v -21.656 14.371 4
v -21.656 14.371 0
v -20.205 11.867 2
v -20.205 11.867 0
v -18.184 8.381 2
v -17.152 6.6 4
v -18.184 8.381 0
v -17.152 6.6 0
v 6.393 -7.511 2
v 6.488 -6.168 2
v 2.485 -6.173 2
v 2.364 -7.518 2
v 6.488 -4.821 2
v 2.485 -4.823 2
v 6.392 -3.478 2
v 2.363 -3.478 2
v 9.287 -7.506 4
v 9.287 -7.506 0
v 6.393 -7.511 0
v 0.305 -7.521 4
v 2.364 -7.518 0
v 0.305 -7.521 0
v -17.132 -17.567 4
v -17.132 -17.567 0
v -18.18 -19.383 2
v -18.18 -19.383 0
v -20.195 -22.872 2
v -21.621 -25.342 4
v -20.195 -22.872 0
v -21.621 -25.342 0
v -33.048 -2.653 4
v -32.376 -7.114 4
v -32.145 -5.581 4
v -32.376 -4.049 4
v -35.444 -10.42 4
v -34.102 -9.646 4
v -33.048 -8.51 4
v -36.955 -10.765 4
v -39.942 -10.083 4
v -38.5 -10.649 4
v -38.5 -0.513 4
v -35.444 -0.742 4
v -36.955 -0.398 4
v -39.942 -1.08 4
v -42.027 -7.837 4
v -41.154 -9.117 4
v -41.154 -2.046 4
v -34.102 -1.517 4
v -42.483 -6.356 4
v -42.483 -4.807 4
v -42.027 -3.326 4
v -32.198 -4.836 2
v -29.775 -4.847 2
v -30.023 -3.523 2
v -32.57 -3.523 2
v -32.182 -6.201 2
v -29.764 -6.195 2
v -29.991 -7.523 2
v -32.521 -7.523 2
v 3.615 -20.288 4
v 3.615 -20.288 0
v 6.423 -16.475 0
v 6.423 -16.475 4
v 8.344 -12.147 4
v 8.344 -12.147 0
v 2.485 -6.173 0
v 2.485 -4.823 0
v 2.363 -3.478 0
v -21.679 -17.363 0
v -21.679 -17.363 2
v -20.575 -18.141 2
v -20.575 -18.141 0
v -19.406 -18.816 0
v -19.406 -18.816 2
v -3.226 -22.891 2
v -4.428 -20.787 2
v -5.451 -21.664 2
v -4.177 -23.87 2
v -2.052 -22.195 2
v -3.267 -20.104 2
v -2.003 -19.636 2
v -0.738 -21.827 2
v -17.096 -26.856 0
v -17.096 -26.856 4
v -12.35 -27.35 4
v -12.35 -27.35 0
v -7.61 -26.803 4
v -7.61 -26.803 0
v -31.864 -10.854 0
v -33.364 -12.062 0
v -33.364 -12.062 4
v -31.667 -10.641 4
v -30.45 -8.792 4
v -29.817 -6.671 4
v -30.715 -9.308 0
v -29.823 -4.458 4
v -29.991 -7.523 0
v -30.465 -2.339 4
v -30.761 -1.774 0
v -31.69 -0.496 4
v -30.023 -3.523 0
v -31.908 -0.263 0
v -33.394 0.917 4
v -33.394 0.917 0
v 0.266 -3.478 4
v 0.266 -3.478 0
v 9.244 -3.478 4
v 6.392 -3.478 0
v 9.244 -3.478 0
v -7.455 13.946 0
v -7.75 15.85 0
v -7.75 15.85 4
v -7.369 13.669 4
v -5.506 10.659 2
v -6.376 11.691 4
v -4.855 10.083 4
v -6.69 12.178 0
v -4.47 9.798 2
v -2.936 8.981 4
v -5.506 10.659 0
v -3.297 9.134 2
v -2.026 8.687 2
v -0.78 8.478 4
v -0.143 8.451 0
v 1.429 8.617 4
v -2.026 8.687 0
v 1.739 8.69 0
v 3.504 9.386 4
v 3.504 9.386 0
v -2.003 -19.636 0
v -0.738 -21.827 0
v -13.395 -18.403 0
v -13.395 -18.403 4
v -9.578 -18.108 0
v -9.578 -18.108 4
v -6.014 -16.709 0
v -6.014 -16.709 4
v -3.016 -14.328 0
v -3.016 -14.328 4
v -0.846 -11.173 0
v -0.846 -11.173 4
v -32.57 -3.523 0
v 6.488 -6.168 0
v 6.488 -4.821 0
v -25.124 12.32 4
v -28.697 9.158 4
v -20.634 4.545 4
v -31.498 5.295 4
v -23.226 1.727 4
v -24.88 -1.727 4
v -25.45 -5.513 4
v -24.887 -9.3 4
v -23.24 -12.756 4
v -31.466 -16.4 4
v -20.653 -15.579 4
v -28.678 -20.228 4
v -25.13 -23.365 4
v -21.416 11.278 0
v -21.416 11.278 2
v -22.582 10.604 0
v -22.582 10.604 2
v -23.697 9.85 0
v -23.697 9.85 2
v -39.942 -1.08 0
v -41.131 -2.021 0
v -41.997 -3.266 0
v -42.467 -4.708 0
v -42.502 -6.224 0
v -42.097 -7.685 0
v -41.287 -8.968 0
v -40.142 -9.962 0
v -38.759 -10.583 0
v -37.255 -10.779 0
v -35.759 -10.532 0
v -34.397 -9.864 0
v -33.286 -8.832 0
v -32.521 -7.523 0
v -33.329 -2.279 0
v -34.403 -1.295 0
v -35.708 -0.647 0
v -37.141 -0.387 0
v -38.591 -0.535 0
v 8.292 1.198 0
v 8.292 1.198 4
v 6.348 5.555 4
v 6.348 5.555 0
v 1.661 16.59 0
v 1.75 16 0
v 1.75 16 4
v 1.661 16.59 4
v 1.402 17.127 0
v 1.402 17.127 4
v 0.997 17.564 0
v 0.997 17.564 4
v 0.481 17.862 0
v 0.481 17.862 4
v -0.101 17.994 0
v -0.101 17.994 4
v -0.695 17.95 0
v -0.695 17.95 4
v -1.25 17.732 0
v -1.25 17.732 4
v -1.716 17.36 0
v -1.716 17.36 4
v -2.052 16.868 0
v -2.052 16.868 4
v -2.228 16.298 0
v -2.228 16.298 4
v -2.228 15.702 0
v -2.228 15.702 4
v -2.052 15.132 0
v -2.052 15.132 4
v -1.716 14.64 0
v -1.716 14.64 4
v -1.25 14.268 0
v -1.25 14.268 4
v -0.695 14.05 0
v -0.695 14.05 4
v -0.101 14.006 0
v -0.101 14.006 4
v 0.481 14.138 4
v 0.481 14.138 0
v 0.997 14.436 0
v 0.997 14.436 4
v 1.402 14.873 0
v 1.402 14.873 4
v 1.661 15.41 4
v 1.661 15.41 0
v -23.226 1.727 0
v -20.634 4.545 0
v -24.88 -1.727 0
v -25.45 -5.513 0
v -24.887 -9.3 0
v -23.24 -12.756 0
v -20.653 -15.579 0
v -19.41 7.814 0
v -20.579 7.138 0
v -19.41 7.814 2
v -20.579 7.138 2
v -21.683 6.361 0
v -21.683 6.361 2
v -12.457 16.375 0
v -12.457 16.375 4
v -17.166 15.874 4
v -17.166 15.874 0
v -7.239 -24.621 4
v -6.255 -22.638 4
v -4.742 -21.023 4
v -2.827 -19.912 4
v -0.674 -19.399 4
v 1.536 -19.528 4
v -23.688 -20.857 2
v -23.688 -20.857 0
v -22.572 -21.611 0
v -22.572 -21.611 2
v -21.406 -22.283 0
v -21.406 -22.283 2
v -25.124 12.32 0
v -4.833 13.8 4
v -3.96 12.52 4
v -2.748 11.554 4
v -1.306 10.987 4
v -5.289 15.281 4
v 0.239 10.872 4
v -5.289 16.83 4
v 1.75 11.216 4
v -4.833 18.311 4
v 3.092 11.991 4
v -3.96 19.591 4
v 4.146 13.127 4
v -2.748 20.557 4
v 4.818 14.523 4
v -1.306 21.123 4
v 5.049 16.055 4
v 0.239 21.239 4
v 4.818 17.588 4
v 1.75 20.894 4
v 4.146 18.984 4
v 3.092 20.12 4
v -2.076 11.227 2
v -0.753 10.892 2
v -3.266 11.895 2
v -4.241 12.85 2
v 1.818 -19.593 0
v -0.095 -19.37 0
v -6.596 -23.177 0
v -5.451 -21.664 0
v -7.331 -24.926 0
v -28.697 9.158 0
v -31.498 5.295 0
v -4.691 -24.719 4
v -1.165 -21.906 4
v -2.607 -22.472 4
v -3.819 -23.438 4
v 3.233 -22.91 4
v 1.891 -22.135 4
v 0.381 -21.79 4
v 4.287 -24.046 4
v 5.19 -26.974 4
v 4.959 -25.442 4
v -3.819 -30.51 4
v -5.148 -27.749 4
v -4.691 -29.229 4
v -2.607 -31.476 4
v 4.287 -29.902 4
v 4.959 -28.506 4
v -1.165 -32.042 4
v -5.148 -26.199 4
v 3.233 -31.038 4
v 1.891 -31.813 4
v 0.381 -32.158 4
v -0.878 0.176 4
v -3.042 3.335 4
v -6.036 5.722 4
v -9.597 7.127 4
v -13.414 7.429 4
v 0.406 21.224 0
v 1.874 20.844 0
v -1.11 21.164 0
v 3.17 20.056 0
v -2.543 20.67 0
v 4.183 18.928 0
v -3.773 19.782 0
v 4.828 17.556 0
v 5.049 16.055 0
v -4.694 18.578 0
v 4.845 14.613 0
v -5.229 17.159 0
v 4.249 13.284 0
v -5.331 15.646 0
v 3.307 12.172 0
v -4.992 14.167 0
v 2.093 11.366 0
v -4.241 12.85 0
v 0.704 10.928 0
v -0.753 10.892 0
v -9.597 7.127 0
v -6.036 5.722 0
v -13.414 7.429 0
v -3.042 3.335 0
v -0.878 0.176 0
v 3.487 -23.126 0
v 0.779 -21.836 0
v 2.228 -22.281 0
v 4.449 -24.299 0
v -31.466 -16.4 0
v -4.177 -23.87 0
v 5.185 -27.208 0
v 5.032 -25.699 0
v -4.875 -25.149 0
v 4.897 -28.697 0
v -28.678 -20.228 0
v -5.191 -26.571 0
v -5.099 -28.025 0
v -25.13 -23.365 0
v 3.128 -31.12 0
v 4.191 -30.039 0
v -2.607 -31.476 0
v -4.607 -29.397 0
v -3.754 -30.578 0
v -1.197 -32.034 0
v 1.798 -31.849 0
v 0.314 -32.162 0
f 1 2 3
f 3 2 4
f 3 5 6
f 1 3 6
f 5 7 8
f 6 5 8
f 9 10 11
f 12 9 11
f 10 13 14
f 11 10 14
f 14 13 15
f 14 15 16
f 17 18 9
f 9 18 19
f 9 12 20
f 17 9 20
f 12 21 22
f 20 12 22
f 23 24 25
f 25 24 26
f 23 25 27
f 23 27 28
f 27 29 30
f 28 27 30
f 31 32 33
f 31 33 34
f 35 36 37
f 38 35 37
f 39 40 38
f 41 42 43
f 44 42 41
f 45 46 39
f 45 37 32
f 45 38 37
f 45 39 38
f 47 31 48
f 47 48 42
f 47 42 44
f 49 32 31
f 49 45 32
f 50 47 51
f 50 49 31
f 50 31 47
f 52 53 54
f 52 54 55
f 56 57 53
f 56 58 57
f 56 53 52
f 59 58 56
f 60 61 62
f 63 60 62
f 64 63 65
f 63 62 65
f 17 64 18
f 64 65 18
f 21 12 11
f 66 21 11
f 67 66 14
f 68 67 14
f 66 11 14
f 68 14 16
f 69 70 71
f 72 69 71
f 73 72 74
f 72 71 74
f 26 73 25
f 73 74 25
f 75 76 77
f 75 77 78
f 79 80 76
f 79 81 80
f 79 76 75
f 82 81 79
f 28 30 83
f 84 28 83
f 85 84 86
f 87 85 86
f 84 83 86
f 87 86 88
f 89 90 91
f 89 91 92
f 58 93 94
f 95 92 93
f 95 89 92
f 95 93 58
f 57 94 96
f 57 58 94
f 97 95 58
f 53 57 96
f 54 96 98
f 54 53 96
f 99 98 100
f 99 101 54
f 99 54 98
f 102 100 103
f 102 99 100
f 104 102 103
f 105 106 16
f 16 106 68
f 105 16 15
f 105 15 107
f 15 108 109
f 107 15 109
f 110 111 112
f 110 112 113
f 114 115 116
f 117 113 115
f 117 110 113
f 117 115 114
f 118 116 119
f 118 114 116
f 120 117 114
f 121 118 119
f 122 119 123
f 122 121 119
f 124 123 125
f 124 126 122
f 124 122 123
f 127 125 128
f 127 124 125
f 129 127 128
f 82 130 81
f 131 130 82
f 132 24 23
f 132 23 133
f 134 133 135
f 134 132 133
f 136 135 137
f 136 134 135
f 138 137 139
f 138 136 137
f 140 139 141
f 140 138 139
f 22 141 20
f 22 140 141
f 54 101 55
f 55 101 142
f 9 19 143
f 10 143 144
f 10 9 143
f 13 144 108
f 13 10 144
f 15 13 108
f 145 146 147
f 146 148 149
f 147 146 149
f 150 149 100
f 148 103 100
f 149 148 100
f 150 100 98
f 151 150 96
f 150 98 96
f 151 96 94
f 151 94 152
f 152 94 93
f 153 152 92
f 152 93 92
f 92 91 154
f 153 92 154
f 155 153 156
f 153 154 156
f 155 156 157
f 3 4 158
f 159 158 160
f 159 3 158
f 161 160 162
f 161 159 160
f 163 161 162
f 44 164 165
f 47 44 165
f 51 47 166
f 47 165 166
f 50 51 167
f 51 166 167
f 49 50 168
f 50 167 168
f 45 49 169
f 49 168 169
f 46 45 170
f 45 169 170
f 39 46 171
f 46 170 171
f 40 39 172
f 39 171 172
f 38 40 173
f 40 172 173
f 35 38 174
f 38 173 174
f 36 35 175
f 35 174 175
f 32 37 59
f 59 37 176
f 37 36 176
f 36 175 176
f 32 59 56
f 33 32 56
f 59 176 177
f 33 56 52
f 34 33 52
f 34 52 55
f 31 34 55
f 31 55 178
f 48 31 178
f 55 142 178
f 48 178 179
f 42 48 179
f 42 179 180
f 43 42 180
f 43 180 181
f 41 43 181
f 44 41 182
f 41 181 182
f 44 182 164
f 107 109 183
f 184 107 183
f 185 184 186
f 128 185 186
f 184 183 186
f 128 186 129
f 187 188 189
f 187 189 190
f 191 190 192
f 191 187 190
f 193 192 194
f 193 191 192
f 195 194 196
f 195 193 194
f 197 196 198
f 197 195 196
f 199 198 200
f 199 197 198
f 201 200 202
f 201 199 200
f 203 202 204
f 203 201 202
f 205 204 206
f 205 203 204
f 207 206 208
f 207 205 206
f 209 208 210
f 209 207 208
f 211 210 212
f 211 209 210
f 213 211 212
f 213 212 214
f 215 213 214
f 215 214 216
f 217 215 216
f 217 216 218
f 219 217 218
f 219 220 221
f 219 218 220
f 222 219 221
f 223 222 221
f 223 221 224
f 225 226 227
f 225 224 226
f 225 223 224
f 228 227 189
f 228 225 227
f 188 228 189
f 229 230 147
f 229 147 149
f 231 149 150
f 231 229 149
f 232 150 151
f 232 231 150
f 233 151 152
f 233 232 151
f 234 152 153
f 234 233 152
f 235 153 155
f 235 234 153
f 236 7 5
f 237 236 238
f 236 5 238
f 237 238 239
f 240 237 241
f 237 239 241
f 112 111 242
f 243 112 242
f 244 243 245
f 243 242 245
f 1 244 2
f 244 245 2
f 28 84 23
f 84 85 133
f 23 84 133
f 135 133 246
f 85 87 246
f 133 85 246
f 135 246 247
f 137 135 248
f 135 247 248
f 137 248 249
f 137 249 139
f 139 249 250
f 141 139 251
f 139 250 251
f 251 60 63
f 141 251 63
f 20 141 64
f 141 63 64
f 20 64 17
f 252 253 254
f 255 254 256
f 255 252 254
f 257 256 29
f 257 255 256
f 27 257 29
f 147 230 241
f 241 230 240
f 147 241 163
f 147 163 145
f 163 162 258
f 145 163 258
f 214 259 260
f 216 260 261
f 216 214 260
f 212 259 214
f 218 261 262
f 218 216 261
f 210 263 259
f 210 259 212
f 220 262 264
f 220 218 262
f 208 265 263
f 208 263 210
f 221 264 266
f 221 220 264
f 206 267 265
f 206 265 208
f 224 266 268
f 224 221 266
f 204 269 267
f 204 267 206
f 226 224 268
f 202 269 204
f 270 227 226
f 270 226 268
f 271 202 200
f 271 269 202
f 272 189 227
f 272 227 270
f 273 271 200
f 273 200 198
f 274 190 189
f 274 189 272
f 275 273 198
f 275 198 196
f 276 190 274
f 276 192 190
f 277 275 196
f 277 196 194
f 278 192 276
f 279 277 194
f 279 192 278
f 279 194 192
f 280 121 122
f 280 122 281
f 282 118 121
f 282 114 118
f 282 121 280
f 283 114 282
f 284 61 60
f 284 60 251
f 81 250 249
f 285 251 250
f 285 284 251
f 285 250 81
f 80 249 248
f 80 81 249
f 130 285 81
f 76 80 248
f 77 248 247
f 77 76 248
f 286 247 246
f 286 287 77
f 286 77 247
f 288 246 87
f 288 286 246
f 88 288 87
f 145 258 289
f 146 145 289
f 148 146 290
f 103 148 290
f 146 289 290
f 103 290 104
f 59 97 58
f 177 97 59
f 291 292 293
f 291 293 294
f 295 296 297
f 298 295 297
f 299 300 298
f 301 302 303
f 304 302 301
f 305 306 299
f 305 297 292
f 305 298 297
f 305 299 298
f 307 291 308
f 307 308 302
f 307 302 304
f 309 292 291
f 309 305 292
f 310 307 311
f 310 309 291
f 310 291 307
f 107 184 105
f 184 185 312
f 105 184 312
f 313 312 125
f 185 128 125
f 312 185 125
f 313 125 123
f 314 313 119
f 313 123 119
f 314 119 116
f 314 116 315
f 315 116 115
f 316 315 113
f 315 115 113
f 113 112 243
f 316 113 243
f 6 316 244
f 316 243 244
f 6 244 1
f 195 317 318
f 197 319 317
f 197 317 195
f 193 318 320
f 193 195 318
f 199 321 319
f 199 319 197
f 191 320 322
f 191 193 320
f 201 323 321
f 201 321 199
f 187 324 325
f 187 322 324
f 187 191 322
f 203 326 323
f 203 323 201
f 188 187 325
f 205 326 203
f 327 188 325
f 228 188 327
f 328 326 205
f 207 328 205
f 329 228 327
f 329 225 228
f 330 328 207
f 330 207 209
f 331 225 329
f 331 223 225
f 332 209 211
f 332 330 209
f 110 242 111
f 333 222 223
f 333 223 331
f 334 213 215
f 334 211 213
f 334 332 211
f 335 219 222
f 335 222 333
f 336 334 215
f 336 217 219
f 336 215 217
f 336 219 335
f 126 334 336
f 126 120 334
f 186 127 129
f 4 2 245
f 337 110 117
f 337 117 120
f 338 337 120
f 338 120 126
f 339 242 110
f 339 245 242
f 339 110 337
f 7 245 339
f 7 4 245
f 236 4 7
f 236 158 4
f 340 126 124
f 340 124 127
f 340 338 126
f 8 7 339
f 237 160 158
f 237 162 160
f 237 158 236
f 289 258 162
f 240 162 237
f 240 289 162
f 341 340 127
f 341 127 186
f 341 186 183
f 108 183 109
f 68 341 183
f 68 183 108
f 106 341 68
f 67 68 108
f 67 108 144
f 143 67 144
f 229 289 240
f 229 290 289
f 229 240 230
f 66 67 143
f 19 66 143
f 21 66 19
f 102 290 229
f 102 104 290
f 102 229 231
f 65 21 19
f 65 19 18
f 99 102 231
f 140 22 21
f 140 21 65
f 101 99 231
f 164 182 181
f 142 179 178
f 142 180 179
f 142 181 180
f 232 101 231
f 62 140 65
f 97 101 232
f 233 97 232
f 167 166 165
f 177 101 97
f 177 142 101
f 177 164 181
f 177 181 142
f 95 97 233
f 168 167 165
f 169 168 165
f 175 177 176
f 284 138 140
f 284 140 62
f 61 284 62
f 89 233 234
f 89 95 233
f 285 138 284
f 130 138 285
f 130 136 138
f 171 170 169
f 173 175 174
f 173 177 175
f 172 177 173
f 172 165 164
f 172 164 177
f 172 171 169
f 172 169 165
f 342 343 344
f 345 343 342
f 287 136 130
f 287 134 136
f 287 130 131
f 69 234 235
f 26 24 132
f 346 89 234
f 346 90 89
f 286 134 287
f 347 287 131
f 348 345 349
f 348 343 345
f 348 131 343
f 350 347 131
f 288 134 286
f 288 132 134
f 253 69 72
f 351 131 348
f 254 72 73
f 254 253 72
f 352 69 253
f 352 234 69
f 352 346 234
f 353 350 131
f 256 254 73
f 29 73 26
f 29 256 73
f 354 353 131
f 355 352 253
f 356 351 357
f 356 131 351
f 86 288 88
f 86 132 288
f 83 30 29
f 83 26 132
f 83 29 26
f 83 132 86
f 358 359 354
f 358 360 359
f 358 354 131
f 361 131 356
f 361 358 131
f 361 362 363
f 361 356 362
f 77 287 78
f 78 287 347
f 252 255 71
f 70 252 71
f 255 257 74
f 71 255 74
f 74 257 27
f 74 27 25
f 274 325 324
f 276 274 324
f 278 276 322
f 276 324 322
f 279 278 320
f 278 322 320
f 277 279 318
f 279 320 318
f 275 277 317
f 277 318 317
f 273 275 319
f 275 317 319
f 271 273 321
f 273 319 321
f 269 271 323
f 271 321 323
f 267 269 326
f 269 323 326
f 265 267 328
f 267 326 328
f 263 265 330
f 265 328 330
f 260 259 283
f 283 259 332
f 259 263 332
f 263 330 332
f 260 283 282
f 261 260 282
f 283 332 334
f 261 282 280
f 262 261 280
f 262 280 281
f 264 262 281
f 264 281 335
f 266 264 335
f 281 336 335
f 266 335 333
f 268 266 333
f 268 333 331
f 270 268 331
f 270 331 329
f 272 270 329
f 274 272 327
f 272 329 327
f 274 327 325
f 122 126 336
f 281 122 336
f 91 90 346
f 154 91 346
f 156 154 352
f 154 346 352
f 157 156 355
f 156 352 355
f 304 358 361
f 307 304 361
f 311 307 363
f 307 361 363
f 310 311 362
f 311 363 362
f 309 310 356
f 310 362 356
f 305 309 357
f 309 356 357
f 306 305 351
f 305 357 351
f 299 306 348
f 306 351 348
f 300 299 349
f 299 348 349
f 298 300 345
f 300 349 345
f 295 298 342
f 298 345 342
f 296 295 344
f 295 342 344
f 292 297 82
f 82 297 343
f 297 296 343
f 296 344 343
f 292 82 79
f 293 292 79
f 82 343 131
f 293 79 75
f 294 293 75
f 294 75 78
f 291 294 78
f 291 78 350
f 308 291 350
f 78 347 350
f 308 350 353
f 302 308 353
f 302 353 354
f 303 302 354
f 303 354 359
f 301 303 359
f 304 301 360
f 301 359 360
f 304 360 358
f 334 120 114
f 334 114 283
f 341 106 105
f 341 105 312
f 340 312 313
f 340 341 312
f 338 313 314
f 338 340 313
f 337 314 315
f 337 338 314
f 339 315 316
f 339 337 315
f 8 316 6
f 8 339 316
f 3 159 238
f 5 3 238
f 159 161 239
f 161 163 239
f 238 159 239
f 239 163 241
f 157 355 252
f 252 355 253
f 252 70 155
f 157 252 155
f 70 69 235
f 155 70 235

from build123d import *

# Parameters (mm, degrees)
CYLINDER008_R               = 2
CYLINDER008_DEPTH           = 10
BOX_W                       = 10
BOX_H                       = 4
BOX_DEPTH                   = 2
BOX_PLACEMENT_ANGLE         = 60
ARRAY001_COUNT              = 3
CYLINDER007_W               = 15
CYLINDER007_H               = 2
CYLINDER007_ANGLE           = 60
CYLINDER007_PLACEMENT_ANGLE = 95
CYLINDER006_W               = 19
CYLINDER006_H               = 2
CYLINDER006_ANGLE           = 60
CYLINDER006_PLACEMENT_ANGLE = 95
CYLINDER005_W               = 15
CYLINDER005_H               = 2
CYLINDER005_ANGLE           = 60
CYLINDER005_PLACEMENT_ANGLE = 211
CYLINDER004_W               = 19
CYLINDER004_H               = 2
CYLINDER004_ANGLE           = 60
CYLINDER004_PLACEMENT_ANGLE = 211
CYLINDER003_W               = 15
CYLINDER003_H               = 2
CYLINDER003_ANGLE           = 60
CYLINDER003_PLACEMENT_ANGLE = -35
CYLINDER002_W               = 19
CYLINDER002_H               = 2
CYLINDER002_ANGLE           = 60
CYLINDER002_PLACEMENT_ANGLE = -35
SKETCH001_R                 = 5.198312
PAD_DEPTH                   = 4
ARRAY_COUNT                 = 3


with BuildPart() as cilindro007:
    # Cylinder008 → Cylinder008 (new body)
    with BuildSketch(Plane(origin=(-0.25, 15, -4), x_dir=(1, 0, 0), z_dir=(0, 0, 1))):
        Circle(CYLINDER008_R)
    extrude(amount=CYLINDER008_DEPTH)


with BuildPart() as array001:
    # Box → Box (new body)
    with BuildSketch(Plane.XY):
        with Locations((5, 2)):
            Rectangle(BOX_W, BOX_H)
    extrude(amount=BOX_DEPTH)


with BuildPart() as array001_1:
    # Box placement: moved
    add(array001.part.moved(Location((-3, 6, 0))).rotate(Axis((-3, 6, 0), (0, 0, 1)), BOX_PLACEMENT_ANGLE))

    # Array001: Array001 ×3 about axis
    array001_axis = Axis((-12.5, -6.5, 0), (0, 0, 1))


with BuildPart() as array001_2:
    add(array001_1.part)
    for i in range(1, ARRAY001_COUNT):
        add(array001_1.part.rotate(array001_axis, i * 360 / ARRAY001_COUNT))


with BuildPart() as cilindro006:
    # Cylinder007 → Cylinder007 (revolve)
    with BuildSketch(Plane.XZ):
        with Locations((7.5, 1)):
            Rectangle(CYLINDER007_W, CYLINDER007_H)
    revolve(axis=Axis((0, 0, 0), (0, 0, 1)), revolution_arc=CYLINDER007_ANGLE)


with BuildPart() as cilindro006_1:
    # Cylinder007 placement: moved
    add(cilindro006.part.moved(Location((-12.5, -6.5, 0))).rotate(Axis((-12.5, -6.5, 0), (0, 0, 1)), CYLINDER007_PLACEMENT_ANGLE))


with BuildPart() as cut003:
    # Cylinder006 → Cylinder006 (revolve)
    with BuildSketch(Plane.XZ):
        with Locations((9.5, 1)):
            Rectangle(CYLINDER006_W, CYLINDER006_H)
    revolve(axis=Axis((0, 0, 0), (0, 0, 1)), revolution_arc=CYLINDER006_ANGLE)


with BuildPart() as cut003_1:
    # Cylinder006 placement: moved
    add(cut003.part.moved(Location((-12.5, -6.5, 0))).rotate(Axis((-12.5, -6.5, 0), (0, 0, 1)), CYLINDER006_PLACEMENT_ANGLE))

    # Cut003: cut Cilindro006
    add(cilindro006_1.part, mode=Mode.SUBTRACT)


with BuildPart() as cilindro004:
    # Cylinder005 → Cylinder005 (revolve)
    with BuildSketch(Plane.XZ):
        with Locations((7.5, 1)):
            Rectangle(CYLINDER005_W, CYLINDER005_H)
    revolve(axis=Axis((0, 0, 0), (0, 0, 1)), revolution_arc=CYLINDER005_ANGLE)


with BuildPart() as cilindro004_1:
    # Cylinder005 placement: moved
    add(cilindro004.part.moved(Location((-12.5, -6.5, 0))).rotate(Axis((-12.5, -6.5, 0), (0, 0, 1)), CYLINDER005_PLACEMENT_ANGLE))


with BuildPart() as cut002:
    # Cylinder004 → Cylinder004 (revolve)
    with BuildSketch(Plane.XZ):
        with Locations((9.5, 1)):
            Rectangle(CYLINDER004_W, CYLINDER004_H)
    revolve(axis=Axis((0, 0, 0), (0, 0, 1)), revolution_arc=CYLINDER004_ANGLE)


with BuildPart() as cut002_1:
    # Cylinder004 placement: moved
    add(cut002.part.moved(Location((-12.5, -6.5, 0))).rotate(Axis((-12.5, -6.5, 0), (0, 0, 1)), CYLINDER004_PLACEMENT_ANGLE))

    # Cut002: cut Cilindro004
    add(cilindro004_1.part, mode=Mode.SUBTRACT)


with BuildPart() as cilindro002:
    # Cylinder003 → Cylinder003 (revolve)
    with BuildSketch(Plane.XZ):
        with Locations((7.5, 1)):
            Rectangle(CYLINDER003_W, CYLINDER003_H)
    revolve(axis=Axis((0, 0, 0), (0, 0, 1)), revolution_arc=CYLINDER003_ANGLE)


with BuildPart() as cilindro002_1:
    # Cylinder003 placement: moved
    add(cilindro002.part.moved(Location((-12.5, -6.5, 0))).rotate(Axis((-12.5, -6.5, 0), (0, 0, 1)), CYLINDER003_PLACEMENT_ANGLE))


with BuildPart() as fusion:
    # Cylinder002 → Cylinder002 (revolve)
    with BuildSketch(Plane.XZ):
        with Locations((9.5, 1)):
            Rectangle(CYLINDER002_W, CYLINDER002_H)
    revolve(axis=Axis((0, 0, 0), (0, 0, 1)), revolution_arc=CYLINDER002_ANGLE)


with BuildPart() as fusion_1:
    # Cylinder002 placement: moved
    add(fusion.part.moved(Location((-12.5, -6.5, 0))).rotate(Axis((-12.5, -6.5, 0), (0, 0, 1)), CYLINDER002_PLACEMENT_ANGLE))

    # Cut001: cut Cilindro002
    add(cilindro002_1.part, mode=Mode.SUBTRACT)

    # Fusion: union Cut003, Cut002
    add(cut003_1.part)
    add(cut002_1.part)


with BuildPart() as cut004:
    # Sketch001 → Pad (new body)
    with BuildSketch(Plane.XY):
        with Locations((-0.149011, 15.05543)):
            Circle(SKETCH001_R)
        with BuildLine():
            ThreePointArc((0.265943, -4.477766), (-6.03588, 4.72153), (-17.151991, 5.600213))
            Line((-21.656212, 13.370653), (-17.151991, 5.600213))
            ThreePointArc((-7.750284, 14.849869), (-14.824787, 15.252835), (-21.656212, 13.370653))
            ThreePointArc((-7.750284, 14.849869), (-3.935994, 8.461466), (3.504091, 8.386363))
            ThreePointArc((9.244463, -4.477766), (7.439427, 2.429601), (3.504091, 8.386363))
            Line((0.265943, -4.477766), (9.244463, -4.477766))
        make_face()
    extrude(amount=PAD_DEPTH)

    # Array: Cut004 ×3 about axis
    array_axis = Axis((-12.5, -6.5, 0), (0, 0, 1))


with BuildPart() as cut004_1:
    add(cut004.part)
    for i in range(1, ARRAY_COUNT):
        add(cut004.part.rotate(array_axis, i * 360 / ARRAY_COUNT))

    # Fusion001: union Fusion
    add(fusion_1.part)

    # Fusion002: union Array001
    add(array001_2.part)

    # Cut004: cut Cilindro007
    add(cilindro007.part, mode=Mode.SUBTRACT)


with BuildPart() as cut004_2:
    # Cut004 placement: moved
    add(cut004_1.part.moved(Location((0, 1, 0))))


solid = cut004_2.part
